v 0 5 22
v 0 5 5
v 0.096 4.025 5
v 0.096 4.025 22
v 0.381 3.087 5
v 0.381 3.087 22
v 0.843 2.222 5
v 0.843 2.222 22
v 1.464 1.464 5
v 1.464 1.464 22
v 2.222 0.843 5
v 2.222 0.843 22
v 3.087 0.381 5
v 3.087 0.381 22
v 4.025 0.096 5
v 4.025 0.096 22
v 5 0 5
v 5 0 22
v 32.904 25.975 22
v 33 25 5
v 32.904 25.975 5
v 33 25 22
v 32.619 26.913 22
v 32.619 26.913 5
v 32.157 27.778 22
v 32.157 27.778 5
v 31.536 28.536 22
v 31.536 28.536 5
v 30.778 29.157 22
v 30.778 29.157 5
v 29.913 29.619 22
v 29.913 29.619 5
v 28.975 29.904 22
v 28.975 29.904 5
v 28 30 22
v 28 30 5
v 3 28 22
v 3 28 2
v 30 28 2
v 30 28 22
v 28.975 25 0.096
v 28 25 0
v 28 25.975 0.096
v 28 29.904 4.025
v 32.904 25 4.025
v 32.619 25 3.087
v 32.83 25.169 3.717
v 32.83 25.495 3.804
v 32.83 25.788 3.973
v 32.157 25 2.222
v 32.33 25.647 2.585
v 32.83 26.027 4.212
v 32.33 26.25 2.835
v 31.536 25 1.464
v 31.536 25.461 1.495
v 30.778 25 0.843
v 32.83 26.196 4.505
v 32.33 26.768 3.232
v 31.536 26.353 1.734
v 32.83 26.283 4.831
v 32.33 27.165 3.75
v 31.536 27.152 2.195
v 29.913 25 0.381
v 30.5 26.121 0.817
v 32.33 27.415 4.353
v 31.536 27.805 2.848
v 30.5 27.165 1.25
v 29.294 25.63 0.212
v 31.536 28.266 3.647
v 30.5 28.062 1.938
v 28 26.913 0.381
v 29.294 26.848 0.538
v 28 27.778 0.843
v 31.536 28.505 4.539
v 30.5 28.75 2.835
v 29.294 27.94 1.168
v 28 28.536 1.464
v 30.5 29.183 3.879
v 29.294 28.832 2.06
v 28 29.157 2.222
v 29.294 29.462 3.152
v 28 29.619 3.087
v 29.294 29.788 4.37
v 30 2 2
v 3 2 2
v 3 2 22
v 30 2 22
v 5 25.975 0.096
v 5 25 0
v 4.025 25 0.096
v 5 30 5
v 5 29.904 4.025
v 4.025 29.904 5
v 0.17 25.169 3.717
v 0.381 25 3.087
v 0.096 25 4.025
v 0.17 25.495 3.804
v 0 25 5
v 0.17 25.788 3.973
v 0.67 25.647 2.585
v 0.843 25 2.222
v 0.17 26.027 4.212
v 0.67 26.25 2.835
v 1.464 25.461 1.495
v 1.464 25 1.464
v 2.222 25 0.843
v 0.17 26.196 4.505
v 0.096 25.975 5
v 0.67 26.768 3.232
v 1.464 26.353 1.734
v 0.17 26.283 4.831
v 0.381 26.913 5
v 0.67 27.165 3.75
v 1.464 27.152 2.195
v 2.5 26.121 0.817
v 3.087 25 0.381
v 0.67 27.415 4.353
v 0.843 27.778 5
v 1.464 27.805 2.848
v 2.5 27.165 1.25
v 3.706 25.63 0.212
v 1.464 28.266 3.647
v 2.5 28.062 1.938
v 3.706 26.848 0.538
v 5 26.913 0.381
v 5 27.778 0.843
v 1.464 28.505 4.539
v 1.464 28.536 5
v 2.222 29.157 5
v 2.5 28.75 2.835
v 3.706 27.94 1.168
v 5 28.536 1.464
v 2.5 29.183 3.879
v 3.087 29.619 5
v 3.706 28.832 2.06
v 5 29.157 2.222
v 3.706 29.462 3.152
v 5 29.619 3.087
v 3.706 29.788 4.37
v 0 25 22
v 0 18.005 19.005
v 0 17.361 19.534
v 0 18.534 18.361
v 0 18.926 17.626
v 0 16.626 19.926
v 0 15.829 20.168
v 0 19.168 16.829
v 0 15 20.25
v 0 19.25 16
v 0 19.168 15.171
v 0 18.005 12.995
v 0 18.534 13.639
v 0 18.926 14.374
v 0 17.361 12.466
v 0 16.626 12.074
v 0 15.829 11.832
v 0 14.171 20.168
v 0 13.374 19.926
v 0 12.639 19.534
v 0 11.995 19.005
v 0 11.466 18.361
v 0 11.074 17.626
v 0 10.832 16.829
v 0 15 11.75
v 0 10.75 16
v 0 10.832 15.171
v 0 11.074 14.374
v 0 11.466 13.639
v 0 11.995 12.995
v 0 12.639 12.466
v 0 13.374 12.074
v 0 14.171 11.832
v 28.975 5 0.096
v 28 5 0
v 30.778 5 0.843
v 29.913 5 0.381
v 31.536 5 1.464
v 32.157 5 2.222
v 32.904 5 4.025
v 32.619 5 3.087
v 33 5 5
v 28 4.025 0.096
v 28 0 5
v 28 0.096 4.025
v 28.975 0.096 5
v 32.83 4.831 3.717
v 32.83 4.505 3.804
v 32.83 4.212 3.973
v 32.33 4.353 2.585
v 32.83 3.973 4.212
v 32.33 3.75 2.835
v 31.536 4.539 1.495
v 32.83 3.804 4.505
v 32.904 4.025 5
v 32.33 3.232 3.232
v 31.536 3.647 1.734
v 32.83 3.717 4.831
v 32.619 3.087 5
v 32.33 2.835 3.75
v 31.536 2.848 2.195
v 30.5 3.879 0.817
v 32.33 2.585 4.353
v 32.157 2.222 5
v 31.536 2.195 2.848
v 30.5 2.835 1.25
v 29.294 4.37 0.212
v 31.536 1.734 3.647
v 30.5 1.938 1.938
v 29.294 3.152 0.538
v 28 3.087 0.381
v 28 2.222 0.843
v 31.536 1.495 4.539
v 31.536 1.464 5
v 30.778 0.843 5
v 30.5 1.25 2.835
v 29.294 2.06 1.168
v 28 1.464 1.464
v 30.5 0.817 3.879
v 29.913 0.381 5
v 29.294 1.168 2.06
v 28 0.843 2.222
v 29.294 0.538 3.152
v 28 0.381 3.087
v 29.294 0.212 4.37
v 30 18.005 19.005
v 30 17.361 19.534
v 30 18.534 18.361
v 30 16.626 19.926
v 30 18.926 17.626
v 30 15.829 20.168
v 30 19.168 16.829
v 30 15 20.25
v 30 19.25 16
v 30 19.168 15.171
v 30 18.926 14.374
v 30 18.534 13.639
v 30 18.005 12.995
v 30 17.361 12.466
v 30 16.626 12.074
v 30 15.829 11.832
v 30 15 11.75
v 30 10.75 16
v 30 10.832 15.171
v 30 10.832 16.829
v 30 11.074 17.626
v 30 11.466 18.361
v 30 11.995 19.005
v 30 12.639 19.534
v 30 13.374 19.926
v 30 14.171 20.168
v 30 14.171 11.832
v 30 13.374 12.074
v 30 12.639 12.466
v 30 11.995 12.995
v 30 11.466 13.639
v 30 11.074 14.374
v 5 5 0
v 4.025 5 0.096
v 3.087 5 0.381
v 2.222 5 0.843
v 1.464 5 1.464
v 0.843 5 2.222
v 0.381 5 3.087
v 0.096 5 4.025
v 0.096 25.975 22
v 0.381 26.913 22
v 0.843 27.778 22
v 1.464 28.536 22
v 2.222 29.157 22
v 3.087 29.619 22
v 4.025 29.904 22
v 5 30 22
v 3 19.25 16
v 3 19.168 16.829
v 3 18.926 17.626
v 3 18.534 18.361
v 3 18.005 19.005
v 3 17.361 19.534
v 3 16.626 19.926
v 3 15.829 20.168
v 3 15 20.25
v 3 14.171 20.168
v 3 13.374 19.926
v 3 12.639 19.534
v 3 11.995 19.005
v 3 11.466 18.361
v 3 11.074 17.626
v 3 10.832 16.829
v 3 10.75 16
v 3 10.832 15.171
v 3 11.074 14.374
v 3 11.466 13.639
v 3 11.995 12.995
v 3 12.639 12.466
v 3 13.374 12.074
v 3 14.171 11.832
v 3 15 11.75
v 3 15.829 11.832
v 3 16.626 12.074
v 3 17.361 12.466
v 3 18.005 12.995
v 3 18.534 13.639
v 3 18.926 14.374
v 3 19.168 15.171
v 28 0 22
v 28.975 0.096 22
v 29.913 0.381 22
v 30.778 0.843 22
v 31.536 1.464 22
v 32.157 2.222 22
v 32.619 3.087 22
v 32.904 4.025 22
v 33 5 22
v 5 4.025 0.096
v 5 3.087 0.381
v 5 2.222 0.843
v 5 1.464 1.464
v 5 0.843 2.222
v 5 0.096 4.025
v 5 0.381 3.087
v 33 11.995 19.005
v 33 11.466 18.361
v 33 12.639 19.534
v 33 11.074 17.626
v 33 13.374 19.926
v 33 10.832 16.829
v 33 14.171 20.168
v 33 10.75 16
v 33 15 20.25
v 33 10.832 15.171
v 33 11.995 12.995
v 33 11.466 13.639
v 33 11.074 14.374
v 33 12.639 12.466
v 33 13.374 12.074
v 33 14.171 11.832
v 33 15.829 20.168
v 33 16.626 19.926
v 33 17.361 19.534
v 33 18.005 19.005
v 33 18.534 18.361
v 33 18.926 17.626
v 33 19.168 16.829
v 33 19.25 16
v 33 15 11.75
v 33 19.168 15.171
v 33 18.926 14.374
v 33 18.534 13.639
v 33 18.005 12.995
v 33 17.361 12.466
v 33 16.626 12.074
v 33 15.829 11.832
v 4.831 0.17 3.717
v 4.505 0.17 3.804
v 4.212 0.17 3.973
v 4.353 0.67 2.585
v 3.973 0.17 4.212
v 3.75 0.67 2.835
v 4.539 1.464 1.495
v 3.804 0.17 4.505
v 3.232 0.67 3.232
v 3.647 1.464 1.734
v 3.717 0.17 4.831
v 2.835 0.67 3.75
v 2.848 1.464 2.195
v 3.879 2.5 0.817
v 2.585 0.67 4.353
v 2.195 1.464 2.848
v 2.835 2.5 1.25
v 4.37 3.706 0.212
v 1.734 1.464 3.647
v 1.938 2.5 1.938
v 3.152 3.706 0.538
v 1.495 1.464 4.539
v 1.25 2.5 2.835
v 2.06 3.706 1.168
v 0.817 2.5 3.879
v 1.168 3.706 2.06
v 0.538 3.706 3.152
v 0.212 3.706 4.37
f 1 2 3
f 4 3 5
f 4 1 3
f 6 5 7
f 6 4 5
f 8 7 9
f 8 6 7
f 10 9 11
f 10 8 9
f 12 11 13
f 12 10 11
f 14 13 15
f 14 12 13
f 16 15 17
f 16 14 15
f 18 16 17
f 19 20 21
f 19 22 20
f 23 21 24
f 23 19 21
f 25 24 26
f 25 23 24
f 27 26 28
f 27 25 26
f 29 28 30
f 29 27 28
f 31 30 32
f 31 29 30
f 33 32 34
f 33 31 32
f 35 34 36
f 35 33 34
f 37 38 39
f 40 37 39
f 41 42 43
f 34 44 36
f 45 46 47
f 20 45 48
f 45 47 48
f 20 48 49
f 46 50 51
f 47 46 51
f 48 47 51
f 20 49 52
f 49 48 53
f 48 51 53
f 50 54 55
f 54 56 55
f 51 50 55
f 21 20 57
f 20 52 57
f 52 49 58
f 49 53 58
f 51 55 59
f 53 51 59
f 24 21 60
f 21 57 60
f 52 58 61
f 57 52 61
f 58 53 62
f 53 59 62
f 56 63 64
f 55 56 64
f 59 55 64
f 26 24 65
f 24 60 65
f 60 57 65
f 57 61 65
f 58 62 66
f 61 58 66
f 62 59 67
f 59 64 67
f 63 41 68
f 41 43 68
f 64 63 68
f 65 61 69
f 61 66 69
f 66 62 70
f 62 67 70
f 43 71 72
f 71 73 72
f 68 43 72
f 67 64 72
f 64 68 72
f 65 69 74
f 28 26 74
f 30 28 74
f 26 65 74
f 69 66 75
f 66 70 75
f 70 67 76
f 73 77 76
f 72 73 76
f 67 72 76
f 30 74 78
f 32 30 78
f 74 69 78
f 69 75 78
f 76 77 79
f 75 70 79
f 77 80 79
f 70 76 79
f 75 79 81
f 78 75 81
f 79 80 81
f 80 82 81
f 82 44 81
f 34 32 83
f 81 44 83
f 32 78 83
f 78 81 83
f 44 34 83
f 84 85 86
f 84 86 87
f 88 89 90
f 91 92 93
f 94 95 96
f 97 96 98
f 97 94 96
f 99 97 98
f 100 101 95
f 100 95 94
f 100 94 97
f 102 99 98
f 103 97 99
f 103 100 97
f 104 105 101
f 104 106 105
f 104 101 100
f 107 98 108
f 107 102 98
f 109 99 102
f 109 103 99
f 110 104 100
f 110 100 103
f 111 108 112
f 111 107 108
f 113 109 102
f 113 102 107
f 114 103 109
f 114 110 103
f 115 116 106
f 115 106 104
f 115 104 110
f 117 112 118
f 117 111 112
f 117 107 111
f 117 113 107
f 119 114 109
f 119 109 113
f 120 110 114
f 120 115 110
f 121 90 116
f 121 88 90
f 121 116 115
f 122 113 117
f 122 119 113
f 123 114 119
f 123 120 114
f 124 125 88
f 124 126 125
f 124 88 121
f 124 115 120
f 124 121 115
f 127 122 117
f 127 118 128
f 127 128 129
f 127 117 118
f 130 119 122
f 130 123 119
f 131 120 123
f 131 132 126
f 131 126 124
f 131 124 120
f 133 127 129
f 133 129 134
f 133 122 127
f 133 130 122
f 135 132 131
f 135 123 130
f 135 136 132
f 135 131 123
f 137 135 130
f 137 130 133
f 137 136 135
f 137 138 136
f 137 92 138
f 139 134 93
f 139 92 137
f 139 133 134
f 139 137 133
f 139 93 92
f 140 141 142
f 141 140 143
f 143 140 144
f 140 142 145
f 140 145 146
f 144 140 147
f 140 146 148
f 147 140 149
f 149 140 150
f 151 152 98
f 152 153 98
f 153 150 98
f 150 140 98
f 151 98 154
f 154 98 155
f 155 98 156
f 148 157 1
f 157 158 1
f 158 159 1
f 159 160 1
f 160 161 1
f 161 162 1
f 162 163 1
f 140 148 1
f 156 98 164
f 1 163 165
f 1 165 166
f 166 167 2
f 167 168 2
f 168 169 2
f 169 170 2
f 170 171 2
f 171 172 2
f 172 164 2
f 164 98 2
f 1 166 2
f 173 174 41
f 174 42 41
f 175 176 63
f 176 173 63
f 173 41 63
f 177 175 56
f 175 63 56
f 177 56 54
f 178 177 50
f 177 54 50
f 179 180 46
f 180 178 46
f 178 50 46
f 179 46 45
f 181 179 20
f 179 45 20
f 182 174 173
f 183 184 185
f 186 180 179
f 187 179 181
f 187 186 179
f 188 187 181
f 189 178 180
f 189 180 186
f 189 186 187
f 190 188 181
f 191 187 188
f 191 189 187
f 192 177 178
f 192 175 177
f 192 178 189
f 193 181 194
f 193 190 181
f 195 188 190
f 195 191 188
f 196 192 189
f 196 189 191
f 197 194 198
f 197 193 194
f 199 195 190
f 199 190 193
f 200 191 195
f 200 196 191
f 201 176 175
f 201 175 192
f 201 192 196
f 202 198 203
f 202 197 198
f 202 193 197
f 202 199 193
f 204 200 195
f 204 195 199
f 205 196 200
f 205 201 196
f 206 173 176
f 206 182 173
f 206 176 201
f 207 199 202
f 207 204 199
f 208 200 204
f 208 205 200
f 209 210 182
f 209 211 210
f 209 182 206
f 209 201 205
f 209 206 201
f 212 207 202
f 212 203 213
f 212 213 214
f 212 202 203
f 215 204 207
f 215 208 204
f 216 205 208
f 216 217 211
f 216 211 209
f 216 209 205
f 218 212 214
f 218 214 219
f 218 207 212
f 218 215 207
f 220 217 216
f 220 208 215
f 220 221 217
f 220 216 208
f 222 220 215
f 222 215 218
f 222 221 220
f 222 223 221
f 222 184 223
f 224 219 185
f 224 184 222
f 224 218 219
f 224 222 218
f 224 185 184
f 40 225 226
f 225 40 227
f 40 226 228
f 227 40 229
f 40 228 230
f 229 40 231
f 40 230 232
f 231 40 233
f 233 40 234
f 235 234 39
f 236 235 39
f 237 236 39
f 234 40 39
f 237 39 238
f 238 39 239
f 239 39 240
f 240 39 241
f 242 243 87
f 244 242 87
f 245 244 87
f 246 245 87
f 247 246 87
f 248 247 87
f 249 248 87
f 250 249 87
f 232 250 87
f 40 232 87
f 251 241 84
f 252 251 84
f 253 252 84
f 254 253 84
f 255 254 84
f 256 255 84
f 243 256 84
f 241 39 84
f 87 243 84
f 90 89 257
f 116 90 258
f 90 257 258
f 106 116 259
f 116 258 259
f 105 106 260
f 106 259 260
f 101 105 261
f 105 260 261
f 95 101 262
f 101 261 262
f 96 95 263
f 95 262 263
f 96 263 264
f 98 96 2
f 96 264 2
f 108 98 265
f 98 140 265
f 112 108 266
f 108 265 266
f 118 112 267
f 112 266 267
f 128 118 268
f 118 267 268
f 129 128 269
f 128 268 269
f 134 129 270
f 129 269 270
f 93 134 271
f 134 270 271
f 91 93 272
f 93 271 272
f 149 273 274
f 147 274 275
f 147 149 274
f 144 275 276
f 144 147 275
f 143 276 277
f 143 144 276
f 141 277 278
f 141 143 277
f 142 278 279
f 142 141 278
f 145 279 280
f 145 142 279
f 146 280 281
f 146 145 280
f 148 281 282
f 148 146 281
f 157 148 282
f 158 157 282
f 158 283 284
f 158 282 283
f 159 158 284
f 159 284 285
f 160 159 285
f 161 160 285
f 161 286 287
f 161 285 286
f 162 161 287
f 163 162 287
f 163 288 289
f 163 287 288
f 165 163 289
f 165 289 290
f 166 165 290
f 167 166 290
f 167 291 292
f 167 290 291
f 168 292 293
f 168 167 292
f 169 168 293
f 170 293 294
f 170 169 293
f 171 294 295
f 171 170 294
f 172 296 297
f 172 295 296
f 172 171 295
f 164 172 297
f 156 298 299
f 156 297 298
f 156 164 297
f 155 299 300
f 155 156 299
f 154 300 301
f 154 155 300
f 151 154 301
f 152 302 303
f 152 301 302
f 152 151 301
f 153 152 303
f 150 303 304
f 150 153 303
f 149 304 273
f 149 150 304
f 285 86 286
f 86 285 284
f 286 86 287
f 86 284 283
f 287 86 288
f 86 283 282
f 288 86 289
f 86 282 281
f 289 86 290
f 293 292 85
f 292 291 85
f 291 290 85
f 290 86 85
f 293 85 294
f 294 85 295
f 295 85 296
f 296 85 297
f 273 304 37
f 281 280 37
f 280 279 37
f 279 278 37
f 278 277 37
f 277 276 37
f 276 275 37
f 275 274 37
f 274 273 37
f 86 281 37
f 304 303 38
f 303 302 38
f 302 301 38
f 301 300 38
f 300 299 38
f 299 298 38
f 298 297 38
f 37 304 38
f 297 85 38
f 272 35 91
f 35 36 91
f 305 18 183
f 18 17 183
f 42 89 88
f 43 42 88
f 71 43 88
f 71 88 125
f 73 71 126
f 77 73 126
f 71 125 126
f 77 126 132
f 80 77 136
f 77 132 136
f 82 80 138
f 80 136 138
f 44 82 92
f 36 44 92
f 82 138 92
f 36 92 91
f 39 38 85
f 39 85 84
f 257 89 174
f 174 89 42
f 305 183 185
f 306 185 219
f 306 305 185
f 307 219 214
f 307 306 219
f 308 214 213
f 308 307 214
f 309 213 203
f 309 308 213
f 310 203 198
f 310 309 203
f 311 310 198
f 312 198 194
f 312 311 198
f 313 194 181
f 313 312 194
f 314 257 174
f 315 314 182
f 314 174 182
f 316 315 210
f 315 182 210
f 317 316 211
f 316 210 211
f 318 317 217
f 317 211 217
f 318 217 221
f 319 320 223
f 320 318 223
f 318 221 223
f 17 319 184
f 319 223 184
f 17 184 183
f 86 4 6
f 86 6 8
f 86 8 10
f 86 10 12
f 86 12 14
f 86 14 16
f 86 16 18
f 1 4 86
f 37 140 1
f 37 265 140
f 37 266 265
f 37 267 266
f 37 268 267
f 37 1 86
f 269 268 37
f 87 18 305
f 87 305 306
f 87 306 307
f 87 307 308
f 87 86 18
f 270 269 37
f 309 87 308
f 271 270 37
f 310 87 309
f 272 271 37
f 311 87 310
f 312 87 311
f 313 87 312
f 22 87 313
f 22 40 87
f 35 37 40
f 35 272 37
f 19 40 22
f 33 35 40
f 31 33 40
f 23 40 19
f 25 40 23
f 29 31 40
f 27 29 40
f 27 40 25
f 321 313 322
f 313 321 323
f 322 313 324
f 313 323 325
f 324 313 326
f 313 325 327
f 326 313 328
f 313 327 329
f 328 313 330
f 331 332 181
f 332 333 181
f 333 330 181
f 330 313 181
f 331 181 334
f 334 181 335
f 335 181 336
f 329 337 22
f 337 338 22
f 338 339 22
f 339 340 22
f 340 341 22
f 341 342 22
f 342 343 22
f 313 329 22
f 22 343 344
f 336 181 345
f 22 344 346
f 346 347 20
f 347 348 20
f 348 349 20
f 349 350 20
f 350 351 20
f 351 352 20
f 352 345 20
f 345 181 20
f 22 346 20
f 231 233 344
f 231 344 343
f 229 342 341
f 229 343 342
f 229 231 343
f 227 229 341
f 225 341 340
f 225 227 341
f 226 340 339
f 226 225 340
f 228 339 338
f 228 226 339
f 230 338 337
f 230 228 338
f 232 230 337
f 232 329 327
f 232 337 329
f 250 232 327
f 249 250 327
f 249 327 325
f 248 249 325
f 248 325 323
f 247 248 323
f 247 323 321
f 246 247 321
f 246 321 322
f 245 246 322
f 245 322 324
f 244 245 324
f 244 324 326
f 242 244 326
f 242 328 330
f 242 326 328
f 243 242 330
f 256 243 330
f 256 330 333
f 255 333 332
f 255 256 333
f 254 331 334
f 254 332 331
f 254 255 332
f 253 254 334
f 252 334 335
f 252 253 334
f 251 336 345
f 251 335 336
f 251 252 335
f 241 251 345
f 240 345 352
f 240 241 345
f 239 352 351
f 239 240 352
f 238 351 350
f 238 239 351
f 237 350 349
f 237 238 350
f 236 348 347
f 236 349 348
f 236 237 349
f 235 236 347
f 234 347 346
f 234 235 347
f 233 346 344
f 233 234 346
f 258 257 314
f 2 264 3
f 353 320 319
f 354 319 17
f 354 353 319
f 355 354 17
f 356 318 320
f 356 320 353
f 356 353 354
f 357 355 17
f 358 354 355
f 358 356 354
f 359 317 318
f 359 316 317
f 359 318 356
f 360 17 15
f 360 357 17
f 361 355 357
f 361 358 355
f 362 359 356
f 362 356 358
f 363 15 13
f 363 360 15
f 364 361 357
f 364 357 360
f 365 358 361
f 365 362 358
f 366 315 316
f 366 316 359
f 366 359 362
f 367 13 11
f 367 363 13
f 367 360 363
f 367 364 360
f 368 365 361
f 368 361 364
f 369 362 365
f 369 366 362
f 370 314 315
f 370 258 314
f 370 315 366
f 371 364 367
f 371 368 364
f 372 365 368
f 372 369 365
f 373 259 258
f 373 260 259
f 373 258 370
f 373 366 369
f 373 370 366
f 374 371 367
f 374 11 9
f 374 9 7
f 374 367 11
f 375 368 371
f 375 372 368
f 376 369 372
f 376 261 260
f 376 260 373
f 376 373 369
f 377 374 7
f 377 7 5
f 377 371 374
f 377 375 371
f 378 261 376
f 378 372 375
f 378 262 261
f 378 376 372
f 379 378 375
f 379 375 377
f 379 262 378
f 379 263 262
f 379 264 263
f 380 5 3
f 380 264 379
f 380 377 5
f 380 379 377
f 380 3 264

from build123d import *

# Parameters (mm, degrees)
F0_W     = 3
F0_H     = 13
F0_H_2   = 2
F0_W_2   = 27
F0_H_3   = 4
F1_DEPTH = 22
F0_W_3   = 7
F0_H_4   = 11.0040441751
F2_DEPTH = 2
F3_R     = 4.25
F4_DEPTH = 40
F5_R     = 5


with BuildPart() as f1:
    # F0 (on Top) → F1 (new body)
    with BuildSketch(Plane.XY):
        Polygon((3, 30), (0, 30), (0, 19), (3, 19), (3, 28), align=None)
        Polygon((33, 30), (3, 30), (3, 28), (30, 28), (33, 28), align=None)
        with Locations((31.5, 21.5)):
            Rectangle(F0_W, F0_H)
        with Locations((31.5, 8.5)):
            Rectangle(F0_W, F0_H)
        with Locations((31.5, 1)):
            Rectangle(F0_W, F0_H_2)
        with Locations((16.5, 1)):
            Rectangle(F0_W_2, F0_H_2)
        Polygon((3, 11), (0, 11), (0, 0), (3, 0), (3, 2), align=None)
        with Locations((1.5, 13)):
            Rectangle(F0_W, F0_H_3)
        with Locations((1.5, 17)):
            Rectangle(F0_W, F0_H_3)
    extrude(amount=F1_DEPTH)

    # F0 (on Top) → F2 (join)
    with BuildSketch(Plane.XY):
        Polygon((30, 28), (3, 28), (3, 19), (3, 15), (6.5, 15), (6.5, 26.0040441751), (13.5, 26.0040441751), (13.5, 15), (16.5, 15), (19.5, 15), (19.5, 26.0040441751), (26.5, 26.0040441751), (26.5, 15), (30, 15), align=None)
        Polygon((6.5, 15), (3, 15), (3, 11), (3, 2), (30, 2), (30, 15), (26.5, 15), (26.5, 3.9959558249), (19.5, 3.9959558249), (19.5, 15), (16.5, 15), (13.5, 15), (13.5, 3.9959558249), (6.5, 3.9959558249), align=None)
        with Locations((10, 9.4979779124)):
            Rectangle(F0_W_3, F0_H_4)
        with Locations((10, 20.5020220876)):
            Rectangle(F0_W_3, F0_H_4)
        with Locations((23, 20.5020220876)):
            Rectangle(F0_W_3, F0_H_4)
        with Locations((23, 9.4979779124)):
            Rectangle(F0_W_3, F0_H_4)
    extrude(amount=F2_DEPTH)

    # F3 (on Right) → F4 (cut)
    with BuildSketch(Plane.YZ):
        with Locations((15, 16)):
            Circle(F3_R)
    extrude(amount=F4_DEPTH, mode=Mode.SUBTRACT)

    # F5
    f5_edges = [f1.edges().sort_by_distance(p)[0] for p in [
        (16.5, 30, 0),
        (0, 15, 0),
        (16.5, 0, 0),
        (33, 15, 0),
        (33, 30, 11),
        (0, 30, 11),
        (0, 0, 11),
        (33, 0, 11),
    ]]
    fillet(f5_edges, radius=F5_R)


solid = f1.part
